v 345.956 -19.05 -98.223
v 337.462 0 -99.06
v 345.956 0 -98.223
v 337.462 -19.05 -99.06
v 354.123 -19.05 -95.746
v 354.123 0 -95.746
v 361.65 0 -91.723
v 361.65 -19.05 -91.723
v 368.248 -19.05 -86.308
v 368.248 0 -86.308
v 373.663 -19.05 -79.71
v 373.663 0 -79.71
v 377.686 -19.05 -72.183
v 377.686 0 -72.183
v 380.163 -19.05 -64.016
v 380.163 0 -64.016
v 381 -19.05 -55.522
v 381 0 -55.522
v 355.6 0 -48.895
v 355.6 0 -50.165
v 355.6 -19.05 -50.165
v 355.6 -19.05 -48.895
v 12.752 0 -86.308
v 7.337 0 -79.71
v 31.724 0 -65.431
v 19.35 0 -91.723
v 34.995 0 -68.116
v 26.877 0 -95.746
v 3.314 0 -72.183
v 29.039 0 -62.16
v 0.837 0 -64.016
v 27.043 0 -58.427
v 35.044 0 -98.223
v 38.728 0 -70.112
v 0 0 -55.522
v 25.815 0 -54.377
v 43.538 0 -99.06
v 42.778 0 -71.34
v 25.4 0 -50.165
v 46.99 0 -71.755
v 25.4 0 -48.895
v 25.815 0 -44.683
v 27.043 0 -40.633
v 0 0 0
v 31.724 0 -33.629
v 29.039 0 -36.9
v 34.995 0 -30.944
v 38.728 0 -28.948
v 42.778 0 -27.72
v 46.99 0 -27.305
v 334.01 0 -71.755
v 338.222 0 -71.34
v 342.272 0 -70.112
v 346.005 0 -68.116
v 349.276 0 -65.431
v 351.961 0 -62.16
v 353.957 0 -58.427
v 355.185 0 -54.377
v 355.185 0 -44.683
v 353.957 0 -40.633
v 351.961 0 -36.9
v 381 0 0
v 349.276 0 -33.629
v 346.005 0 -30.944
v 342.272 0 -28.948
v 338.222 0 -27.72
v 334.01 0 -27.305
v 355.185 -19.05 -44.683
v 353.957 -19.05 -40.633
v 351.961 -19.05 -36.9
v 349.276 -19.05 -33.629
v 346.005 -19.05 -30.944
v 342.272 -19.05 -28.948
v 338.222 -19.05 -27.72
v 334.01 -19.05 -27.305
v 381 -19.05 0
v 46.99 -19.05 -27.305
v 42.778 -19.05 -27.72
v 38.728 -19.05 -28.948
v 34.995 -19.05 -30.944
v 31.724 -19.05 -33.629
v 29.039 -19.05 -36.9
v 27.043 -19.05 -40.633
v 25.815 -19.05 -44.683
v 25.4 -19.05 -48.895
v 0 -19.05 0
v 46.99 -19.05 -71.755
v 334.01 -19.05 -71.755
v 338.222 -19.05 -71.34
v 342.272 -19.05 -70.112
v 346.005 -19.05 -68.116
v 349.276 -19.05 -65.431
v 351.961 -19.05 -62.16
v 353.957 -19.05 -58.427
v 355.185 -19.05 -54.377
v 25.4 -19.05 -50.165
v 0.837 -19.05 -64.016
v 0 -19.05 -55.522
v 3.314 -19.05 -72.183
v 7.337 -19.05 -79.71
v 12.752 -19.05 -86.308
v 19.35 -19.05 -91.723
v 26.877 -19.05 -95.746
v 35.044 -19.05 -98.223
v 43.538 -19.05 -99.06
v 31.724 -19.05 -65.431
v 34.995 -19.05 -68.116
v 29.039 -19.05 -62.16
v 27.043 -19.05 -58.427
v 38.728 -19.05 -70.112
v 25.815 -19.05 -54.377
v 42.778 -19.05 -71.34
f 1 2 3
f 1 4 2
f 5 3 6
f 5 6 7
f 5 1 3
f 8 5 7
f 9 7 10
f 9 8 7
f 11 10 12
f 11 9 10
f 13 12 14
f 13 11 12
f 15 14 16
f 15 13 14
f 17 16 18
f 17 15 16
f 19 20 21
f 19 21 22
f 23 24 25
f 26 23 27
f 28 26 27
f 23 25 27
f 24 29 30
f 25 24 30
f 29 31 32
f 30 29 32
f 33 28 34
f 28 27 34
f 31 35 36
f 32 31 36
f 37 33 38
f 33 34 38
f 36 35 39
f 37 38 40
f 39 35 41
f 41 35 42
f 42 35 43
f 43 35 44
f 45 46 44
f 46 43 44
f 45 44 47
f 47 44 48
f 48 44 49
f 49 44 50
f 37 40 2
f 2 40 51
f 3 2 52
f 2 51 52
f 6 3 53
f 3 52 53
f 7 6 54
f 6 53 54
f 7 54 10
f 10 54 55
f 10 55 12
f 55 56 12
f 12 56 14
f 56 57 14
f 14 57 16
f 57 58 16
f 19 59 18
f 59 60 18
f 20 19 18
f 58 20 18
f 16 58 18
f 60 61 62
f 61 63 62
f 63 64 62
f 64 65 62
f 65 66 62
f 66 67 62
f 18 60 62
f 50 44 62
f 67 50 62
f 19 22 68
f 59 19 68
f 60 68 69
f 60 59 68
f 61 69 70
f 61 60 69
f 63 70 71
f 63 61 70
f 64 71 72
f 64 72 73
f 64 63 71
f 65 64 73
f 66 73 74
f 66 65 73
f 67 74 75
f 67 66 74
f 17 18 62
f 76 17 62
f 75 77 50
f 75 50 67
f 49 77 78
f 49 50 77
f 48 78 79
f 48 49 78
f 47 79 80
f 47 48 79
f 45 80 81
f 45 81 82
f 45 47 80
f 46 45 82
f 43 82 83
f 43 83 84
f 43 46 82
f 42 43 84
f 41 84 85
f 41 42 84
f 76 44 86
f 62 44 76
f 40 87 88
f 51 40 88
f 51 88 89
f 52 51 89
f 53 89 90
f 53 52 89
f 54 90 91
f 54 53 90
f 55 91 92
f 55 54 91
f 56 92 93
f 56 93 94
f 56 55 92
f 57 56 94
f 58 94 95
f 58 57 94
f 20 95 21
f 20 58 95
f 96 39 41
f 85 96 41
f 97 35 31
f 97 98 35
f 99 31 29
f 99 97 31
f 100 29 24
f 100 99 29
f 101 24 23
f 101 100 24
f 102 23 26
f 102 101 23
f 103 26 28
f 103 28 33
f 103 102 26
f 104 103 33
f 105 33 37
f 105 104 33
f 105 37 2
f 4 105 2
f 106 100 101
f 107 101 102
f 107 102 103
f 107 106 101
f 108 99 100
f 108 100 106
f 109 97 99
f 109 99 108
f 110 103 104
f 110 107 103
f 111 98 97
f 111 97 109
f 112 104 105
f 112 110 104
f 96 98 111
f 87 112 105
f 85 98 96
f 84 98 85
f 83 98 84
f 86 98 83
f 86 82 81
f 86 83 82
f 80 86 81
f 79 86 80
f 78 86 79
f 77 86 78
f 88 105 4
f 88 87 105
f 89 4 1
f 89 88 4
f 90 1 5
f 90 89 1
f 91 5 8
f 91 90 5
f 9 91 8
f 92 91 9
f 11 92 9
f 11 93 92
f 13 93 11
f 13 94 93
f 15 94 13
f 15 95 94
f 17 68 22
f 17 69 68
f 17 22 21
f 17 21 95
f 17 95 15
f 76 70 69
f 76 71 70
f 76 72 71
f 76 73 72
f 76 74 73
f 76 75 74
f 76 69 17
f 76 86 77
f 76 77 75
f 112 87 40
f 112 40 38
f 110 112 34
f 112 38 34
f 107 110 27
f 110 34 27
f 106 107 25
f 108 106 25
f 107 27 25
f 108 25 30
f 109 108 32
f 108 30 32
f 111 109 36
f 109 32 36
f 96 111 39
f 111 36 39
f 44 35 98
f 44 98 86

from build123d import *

# Parameters (mm, degrees)
F0_W     = 381
F0_H     = 99.06
F1_DEPTH = 19.05
F2_R     = 43.537927
F3_W     = 330.2
F3_H     = 44.45
F4_DEPTH = 19.051
F5_R     = 21.59


with BuildPart() as f1:
    # F0 (on Front) → F1 (new body)
    with BuildSketch(Plane.XZ):
        with Locations((190.5, -49.53)):
            Rectangle(F0_W, F0_H)
    extrude(amount=F1_DEPTH)

    # F2
    f2_edges = [f1.edges().sort_by_distance(p)[0] for p in [
        (0, -9.525, -99.06),
        (381, -9.525, -99.06),
    ]]
    fillet(f2_edges, radius=F2_R)

    # F3 (on face) → F4 (cut, through all)
    with BuildSketch(Plane.XZ.offset(19.05)):
        with Locations((190.5, -49.53)):
            Rectangle(F3_W, F3_H)
    extrude(amount=-F4_DEPTH, mode=Mode.SUBTRACT)

    # F5
    f5_edges = [f1.edges().sort_by_distance(p)[0] for p in [
        (25.4, -9.525, -71.755),
        (25.4, -9.525, -27.305),
        (355.6, -9.525, -27.305),
        (355.6, -9.525, -71.755),
    ]]
    fillet(f5_edges, radius=F5_R)


solid = f1.part
